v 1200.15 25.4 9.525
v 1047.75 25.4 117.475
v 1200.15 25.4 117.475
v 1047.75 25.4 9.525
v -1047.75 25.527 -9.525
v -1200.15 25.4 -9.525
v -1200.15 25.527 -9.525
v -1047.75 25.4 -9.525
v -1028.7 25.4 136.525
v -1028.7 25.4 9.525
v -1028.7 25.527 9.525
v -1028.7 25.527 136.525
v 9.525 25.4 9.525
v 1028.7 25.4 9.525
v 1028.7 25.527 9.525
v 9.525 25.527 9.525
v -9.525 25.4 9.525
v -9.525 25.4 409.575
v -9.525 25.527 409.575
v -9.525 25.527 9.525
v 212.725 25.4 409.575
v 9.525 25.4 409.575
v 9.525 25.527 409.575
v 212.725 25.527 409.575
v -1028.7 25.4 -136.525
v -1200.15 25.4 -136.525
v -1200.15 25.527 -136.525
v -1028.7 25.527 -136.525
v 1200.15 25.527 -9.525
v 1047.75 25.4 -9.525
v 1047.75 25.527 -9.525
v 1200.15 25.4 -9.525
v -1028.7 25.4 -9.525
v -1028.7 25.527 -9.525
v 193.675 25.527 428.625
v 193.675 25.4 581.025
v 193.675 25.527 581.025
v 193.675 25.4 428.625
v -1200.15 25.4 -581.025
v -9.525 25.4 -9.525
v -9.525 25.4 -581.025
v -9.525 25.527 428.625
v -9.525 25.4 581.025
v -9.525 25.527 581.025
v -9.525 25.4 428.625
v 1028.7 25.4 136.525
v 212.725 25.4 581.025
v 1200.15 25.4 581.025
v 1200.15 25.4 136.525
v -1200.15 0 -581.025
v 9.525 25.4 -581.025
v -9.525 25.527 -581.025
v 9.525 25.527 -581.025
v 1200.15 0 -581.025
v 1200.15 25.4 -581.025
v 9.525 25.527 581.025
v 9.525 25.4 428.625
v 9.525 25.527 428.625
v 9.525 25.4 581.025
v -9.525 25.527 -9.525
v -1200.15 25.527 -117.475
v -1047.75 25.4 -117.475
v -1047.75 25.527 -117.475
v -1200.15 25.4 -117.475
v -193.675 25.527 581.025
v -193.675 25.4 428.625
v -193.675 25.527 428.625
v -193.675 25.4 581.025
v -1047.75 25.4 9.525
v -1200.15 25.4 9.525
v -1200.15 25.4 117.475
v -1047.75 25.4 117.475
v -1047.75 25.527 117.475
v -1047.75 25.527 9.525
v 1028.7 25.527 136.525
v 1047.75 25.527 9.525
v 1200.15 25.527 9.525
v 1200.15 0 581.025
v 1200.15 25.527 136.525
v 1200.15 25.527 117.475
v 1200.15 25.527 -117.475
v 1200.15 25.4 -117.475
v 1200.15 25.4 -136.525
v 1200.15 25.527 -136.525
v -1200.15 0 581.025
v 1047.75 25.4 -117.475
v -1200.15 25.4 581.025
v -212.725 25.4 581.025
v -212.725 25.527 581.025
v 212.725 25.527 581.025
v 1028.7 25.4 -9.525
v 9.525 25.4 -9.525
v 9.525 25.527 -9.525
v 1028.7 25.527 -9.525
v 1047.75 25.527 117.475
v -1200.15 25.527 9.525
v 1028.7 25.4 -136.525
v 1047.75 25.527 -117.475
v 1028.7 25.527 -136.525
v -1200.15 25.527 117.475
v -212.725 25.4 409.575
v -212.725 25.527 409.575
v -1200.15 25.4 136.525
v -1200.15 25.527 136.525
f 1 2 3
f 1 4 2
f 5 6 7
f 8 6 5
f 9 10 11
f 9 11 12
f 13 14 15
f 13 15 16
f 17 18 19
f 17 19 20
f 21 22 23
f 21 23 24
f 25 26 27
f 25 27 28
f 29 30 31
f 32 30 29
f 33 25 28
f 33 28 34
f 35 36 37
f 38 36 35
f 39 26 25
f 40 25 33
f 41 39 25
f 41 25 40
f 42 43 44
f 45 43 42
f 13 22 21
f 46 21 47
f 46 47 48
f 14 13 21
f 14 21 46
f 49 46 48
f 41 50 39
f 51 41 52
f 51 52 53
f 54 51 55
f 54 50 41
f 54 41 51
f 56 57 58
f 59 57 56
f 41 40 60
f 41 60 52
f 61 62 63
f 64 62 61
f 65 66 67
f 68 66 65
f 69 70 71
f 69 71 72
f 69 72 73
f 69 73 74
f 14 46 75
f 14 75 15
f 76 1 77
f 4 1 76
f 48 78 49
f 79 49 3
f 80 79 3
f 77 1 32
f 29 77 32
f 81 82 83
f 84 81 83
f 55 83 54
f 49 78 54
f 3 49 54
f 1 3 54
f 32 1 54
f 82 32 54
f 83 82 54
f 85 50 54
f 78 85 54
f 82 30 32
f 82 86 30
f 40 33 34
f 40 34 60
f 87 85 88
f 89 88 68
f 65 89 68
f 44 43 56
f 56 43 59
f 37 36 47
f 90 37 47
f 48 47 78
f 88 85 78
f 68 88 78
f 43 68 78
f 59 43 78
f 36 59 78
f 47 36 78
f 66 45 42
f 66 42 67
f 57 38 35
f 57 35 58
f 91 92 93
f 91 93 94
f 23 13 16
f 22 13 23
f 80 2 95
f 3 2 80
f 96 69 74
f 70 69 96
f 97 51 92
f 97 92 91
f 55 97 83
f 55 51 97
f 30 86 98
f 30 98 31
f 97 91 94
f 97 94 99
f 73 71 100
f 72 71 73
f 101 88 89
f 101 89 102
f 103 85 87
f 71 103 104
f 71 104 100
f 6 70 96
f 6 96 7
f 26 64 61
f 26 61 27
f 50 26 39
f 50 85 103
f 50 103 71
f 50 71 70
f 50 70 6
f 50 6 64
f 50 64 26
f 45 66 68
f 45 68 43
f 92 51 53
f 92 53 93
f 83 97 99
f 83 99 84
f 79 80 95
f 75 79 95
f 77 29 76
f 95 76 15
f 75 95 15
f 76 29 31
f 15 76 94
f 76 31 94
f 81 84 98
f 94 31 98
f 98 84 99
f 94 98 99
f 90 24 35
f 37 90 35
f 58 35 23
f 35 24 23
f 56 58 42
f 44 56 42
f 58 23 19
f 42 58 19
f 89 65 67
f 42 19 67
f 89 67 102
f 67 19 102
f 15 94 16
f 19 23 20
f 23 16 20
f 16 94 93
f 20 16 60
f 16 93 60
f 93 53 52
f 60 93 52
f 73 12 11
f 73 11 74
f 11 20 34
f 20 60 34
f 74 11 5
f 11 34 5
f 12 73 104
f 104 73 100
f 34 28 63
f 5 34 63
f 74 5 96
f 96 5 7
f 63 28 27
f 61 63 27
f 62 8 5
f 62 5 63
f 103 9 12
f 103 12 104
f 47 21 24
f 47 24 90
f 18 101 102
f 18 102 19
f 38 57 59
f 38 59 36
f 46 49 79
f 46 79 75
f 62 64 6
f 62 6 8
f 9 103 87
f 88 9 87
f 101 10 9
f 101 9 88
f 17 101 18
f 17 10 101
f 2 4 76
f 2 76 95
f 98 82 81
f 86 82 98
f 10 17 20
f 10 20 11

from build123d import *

# Parameters (mm, degrees)
SKETCH1_W           = 2400.3
SKETCH1_H           = 1162.05
BOSS_EXTRUDE1_DEPTH = 25.4
BOSS_EXTRUDE2_DEPTH = 0.127


with BuildPart() as part:
    # Sketch1 → Boss-Extrude1 (new body)
    with BuildSketch(Plane(origin=(0, 0, 0), x_dir=(1, 0, 0), z_dir=(0, 1, 0))):
        Rectangle(SKETCH1_W, SKETCH1_H)
    extrude(amount=BOSS_EXTRUDE1_DEPTH)

    # Sketch2 → Boss-Extrude2 (add)
    with BuildSketch(Plane(origin=(0, 25.4, 0), x_dir=(1, 0, 0), z_dir=(0, 1, 0))):
        Polygon((-1200.15, 136.525), (-1028.7, 136.525), (-1028.7, 9.525), (-9.525, 9.525), (-9.525, 581.025), (9.525, 581.025), (9.525, 9.525), (1028.7, 9.525), (1028.7, 136.525), (1200.15, 136.525), (1200.15, 117.475), (1047.75, 117.475), (1047.75, 9.525), (1200.15, 9.525), (1200.15, -9.525), (1047.75, -9.525), (1047.75, -117.475), (1200.15, -117.475), (1200.15, -136.525), (1028.7, -136.525), (1028.7, -9.525), (9.525, -9.525), (9.525, -409.575), (212.725, -409.575), (212.725, -581.025), (193.675, -581.025), (193.675, -428.625), (9.525, -428.625), (9.525, -581.025), (-9.525, -581.025), (-9.525, -428.625), (-193.675, -428.625), (-193.675, -581.025), (-212.725, -581.025), (-212.725, -409.575), (-9.525, -409.575), (-9.525, -9.525), (-1028.7, -9.525), (-1028.7, -136.525), (-1200.15, -136.525), (-1200.15, -117.475), (-1047.75, -117.475), (-1047.75, -9.525), (-1200.15, -9.525), (-1200.15, 9.525), (-1047.75, 9.525), (-1047.75, 117.475), (-1200.15, 117.475), align=None)
    extrude(amount=BOSS_EXTRUDE2_DEPTH)


solid = part.part
